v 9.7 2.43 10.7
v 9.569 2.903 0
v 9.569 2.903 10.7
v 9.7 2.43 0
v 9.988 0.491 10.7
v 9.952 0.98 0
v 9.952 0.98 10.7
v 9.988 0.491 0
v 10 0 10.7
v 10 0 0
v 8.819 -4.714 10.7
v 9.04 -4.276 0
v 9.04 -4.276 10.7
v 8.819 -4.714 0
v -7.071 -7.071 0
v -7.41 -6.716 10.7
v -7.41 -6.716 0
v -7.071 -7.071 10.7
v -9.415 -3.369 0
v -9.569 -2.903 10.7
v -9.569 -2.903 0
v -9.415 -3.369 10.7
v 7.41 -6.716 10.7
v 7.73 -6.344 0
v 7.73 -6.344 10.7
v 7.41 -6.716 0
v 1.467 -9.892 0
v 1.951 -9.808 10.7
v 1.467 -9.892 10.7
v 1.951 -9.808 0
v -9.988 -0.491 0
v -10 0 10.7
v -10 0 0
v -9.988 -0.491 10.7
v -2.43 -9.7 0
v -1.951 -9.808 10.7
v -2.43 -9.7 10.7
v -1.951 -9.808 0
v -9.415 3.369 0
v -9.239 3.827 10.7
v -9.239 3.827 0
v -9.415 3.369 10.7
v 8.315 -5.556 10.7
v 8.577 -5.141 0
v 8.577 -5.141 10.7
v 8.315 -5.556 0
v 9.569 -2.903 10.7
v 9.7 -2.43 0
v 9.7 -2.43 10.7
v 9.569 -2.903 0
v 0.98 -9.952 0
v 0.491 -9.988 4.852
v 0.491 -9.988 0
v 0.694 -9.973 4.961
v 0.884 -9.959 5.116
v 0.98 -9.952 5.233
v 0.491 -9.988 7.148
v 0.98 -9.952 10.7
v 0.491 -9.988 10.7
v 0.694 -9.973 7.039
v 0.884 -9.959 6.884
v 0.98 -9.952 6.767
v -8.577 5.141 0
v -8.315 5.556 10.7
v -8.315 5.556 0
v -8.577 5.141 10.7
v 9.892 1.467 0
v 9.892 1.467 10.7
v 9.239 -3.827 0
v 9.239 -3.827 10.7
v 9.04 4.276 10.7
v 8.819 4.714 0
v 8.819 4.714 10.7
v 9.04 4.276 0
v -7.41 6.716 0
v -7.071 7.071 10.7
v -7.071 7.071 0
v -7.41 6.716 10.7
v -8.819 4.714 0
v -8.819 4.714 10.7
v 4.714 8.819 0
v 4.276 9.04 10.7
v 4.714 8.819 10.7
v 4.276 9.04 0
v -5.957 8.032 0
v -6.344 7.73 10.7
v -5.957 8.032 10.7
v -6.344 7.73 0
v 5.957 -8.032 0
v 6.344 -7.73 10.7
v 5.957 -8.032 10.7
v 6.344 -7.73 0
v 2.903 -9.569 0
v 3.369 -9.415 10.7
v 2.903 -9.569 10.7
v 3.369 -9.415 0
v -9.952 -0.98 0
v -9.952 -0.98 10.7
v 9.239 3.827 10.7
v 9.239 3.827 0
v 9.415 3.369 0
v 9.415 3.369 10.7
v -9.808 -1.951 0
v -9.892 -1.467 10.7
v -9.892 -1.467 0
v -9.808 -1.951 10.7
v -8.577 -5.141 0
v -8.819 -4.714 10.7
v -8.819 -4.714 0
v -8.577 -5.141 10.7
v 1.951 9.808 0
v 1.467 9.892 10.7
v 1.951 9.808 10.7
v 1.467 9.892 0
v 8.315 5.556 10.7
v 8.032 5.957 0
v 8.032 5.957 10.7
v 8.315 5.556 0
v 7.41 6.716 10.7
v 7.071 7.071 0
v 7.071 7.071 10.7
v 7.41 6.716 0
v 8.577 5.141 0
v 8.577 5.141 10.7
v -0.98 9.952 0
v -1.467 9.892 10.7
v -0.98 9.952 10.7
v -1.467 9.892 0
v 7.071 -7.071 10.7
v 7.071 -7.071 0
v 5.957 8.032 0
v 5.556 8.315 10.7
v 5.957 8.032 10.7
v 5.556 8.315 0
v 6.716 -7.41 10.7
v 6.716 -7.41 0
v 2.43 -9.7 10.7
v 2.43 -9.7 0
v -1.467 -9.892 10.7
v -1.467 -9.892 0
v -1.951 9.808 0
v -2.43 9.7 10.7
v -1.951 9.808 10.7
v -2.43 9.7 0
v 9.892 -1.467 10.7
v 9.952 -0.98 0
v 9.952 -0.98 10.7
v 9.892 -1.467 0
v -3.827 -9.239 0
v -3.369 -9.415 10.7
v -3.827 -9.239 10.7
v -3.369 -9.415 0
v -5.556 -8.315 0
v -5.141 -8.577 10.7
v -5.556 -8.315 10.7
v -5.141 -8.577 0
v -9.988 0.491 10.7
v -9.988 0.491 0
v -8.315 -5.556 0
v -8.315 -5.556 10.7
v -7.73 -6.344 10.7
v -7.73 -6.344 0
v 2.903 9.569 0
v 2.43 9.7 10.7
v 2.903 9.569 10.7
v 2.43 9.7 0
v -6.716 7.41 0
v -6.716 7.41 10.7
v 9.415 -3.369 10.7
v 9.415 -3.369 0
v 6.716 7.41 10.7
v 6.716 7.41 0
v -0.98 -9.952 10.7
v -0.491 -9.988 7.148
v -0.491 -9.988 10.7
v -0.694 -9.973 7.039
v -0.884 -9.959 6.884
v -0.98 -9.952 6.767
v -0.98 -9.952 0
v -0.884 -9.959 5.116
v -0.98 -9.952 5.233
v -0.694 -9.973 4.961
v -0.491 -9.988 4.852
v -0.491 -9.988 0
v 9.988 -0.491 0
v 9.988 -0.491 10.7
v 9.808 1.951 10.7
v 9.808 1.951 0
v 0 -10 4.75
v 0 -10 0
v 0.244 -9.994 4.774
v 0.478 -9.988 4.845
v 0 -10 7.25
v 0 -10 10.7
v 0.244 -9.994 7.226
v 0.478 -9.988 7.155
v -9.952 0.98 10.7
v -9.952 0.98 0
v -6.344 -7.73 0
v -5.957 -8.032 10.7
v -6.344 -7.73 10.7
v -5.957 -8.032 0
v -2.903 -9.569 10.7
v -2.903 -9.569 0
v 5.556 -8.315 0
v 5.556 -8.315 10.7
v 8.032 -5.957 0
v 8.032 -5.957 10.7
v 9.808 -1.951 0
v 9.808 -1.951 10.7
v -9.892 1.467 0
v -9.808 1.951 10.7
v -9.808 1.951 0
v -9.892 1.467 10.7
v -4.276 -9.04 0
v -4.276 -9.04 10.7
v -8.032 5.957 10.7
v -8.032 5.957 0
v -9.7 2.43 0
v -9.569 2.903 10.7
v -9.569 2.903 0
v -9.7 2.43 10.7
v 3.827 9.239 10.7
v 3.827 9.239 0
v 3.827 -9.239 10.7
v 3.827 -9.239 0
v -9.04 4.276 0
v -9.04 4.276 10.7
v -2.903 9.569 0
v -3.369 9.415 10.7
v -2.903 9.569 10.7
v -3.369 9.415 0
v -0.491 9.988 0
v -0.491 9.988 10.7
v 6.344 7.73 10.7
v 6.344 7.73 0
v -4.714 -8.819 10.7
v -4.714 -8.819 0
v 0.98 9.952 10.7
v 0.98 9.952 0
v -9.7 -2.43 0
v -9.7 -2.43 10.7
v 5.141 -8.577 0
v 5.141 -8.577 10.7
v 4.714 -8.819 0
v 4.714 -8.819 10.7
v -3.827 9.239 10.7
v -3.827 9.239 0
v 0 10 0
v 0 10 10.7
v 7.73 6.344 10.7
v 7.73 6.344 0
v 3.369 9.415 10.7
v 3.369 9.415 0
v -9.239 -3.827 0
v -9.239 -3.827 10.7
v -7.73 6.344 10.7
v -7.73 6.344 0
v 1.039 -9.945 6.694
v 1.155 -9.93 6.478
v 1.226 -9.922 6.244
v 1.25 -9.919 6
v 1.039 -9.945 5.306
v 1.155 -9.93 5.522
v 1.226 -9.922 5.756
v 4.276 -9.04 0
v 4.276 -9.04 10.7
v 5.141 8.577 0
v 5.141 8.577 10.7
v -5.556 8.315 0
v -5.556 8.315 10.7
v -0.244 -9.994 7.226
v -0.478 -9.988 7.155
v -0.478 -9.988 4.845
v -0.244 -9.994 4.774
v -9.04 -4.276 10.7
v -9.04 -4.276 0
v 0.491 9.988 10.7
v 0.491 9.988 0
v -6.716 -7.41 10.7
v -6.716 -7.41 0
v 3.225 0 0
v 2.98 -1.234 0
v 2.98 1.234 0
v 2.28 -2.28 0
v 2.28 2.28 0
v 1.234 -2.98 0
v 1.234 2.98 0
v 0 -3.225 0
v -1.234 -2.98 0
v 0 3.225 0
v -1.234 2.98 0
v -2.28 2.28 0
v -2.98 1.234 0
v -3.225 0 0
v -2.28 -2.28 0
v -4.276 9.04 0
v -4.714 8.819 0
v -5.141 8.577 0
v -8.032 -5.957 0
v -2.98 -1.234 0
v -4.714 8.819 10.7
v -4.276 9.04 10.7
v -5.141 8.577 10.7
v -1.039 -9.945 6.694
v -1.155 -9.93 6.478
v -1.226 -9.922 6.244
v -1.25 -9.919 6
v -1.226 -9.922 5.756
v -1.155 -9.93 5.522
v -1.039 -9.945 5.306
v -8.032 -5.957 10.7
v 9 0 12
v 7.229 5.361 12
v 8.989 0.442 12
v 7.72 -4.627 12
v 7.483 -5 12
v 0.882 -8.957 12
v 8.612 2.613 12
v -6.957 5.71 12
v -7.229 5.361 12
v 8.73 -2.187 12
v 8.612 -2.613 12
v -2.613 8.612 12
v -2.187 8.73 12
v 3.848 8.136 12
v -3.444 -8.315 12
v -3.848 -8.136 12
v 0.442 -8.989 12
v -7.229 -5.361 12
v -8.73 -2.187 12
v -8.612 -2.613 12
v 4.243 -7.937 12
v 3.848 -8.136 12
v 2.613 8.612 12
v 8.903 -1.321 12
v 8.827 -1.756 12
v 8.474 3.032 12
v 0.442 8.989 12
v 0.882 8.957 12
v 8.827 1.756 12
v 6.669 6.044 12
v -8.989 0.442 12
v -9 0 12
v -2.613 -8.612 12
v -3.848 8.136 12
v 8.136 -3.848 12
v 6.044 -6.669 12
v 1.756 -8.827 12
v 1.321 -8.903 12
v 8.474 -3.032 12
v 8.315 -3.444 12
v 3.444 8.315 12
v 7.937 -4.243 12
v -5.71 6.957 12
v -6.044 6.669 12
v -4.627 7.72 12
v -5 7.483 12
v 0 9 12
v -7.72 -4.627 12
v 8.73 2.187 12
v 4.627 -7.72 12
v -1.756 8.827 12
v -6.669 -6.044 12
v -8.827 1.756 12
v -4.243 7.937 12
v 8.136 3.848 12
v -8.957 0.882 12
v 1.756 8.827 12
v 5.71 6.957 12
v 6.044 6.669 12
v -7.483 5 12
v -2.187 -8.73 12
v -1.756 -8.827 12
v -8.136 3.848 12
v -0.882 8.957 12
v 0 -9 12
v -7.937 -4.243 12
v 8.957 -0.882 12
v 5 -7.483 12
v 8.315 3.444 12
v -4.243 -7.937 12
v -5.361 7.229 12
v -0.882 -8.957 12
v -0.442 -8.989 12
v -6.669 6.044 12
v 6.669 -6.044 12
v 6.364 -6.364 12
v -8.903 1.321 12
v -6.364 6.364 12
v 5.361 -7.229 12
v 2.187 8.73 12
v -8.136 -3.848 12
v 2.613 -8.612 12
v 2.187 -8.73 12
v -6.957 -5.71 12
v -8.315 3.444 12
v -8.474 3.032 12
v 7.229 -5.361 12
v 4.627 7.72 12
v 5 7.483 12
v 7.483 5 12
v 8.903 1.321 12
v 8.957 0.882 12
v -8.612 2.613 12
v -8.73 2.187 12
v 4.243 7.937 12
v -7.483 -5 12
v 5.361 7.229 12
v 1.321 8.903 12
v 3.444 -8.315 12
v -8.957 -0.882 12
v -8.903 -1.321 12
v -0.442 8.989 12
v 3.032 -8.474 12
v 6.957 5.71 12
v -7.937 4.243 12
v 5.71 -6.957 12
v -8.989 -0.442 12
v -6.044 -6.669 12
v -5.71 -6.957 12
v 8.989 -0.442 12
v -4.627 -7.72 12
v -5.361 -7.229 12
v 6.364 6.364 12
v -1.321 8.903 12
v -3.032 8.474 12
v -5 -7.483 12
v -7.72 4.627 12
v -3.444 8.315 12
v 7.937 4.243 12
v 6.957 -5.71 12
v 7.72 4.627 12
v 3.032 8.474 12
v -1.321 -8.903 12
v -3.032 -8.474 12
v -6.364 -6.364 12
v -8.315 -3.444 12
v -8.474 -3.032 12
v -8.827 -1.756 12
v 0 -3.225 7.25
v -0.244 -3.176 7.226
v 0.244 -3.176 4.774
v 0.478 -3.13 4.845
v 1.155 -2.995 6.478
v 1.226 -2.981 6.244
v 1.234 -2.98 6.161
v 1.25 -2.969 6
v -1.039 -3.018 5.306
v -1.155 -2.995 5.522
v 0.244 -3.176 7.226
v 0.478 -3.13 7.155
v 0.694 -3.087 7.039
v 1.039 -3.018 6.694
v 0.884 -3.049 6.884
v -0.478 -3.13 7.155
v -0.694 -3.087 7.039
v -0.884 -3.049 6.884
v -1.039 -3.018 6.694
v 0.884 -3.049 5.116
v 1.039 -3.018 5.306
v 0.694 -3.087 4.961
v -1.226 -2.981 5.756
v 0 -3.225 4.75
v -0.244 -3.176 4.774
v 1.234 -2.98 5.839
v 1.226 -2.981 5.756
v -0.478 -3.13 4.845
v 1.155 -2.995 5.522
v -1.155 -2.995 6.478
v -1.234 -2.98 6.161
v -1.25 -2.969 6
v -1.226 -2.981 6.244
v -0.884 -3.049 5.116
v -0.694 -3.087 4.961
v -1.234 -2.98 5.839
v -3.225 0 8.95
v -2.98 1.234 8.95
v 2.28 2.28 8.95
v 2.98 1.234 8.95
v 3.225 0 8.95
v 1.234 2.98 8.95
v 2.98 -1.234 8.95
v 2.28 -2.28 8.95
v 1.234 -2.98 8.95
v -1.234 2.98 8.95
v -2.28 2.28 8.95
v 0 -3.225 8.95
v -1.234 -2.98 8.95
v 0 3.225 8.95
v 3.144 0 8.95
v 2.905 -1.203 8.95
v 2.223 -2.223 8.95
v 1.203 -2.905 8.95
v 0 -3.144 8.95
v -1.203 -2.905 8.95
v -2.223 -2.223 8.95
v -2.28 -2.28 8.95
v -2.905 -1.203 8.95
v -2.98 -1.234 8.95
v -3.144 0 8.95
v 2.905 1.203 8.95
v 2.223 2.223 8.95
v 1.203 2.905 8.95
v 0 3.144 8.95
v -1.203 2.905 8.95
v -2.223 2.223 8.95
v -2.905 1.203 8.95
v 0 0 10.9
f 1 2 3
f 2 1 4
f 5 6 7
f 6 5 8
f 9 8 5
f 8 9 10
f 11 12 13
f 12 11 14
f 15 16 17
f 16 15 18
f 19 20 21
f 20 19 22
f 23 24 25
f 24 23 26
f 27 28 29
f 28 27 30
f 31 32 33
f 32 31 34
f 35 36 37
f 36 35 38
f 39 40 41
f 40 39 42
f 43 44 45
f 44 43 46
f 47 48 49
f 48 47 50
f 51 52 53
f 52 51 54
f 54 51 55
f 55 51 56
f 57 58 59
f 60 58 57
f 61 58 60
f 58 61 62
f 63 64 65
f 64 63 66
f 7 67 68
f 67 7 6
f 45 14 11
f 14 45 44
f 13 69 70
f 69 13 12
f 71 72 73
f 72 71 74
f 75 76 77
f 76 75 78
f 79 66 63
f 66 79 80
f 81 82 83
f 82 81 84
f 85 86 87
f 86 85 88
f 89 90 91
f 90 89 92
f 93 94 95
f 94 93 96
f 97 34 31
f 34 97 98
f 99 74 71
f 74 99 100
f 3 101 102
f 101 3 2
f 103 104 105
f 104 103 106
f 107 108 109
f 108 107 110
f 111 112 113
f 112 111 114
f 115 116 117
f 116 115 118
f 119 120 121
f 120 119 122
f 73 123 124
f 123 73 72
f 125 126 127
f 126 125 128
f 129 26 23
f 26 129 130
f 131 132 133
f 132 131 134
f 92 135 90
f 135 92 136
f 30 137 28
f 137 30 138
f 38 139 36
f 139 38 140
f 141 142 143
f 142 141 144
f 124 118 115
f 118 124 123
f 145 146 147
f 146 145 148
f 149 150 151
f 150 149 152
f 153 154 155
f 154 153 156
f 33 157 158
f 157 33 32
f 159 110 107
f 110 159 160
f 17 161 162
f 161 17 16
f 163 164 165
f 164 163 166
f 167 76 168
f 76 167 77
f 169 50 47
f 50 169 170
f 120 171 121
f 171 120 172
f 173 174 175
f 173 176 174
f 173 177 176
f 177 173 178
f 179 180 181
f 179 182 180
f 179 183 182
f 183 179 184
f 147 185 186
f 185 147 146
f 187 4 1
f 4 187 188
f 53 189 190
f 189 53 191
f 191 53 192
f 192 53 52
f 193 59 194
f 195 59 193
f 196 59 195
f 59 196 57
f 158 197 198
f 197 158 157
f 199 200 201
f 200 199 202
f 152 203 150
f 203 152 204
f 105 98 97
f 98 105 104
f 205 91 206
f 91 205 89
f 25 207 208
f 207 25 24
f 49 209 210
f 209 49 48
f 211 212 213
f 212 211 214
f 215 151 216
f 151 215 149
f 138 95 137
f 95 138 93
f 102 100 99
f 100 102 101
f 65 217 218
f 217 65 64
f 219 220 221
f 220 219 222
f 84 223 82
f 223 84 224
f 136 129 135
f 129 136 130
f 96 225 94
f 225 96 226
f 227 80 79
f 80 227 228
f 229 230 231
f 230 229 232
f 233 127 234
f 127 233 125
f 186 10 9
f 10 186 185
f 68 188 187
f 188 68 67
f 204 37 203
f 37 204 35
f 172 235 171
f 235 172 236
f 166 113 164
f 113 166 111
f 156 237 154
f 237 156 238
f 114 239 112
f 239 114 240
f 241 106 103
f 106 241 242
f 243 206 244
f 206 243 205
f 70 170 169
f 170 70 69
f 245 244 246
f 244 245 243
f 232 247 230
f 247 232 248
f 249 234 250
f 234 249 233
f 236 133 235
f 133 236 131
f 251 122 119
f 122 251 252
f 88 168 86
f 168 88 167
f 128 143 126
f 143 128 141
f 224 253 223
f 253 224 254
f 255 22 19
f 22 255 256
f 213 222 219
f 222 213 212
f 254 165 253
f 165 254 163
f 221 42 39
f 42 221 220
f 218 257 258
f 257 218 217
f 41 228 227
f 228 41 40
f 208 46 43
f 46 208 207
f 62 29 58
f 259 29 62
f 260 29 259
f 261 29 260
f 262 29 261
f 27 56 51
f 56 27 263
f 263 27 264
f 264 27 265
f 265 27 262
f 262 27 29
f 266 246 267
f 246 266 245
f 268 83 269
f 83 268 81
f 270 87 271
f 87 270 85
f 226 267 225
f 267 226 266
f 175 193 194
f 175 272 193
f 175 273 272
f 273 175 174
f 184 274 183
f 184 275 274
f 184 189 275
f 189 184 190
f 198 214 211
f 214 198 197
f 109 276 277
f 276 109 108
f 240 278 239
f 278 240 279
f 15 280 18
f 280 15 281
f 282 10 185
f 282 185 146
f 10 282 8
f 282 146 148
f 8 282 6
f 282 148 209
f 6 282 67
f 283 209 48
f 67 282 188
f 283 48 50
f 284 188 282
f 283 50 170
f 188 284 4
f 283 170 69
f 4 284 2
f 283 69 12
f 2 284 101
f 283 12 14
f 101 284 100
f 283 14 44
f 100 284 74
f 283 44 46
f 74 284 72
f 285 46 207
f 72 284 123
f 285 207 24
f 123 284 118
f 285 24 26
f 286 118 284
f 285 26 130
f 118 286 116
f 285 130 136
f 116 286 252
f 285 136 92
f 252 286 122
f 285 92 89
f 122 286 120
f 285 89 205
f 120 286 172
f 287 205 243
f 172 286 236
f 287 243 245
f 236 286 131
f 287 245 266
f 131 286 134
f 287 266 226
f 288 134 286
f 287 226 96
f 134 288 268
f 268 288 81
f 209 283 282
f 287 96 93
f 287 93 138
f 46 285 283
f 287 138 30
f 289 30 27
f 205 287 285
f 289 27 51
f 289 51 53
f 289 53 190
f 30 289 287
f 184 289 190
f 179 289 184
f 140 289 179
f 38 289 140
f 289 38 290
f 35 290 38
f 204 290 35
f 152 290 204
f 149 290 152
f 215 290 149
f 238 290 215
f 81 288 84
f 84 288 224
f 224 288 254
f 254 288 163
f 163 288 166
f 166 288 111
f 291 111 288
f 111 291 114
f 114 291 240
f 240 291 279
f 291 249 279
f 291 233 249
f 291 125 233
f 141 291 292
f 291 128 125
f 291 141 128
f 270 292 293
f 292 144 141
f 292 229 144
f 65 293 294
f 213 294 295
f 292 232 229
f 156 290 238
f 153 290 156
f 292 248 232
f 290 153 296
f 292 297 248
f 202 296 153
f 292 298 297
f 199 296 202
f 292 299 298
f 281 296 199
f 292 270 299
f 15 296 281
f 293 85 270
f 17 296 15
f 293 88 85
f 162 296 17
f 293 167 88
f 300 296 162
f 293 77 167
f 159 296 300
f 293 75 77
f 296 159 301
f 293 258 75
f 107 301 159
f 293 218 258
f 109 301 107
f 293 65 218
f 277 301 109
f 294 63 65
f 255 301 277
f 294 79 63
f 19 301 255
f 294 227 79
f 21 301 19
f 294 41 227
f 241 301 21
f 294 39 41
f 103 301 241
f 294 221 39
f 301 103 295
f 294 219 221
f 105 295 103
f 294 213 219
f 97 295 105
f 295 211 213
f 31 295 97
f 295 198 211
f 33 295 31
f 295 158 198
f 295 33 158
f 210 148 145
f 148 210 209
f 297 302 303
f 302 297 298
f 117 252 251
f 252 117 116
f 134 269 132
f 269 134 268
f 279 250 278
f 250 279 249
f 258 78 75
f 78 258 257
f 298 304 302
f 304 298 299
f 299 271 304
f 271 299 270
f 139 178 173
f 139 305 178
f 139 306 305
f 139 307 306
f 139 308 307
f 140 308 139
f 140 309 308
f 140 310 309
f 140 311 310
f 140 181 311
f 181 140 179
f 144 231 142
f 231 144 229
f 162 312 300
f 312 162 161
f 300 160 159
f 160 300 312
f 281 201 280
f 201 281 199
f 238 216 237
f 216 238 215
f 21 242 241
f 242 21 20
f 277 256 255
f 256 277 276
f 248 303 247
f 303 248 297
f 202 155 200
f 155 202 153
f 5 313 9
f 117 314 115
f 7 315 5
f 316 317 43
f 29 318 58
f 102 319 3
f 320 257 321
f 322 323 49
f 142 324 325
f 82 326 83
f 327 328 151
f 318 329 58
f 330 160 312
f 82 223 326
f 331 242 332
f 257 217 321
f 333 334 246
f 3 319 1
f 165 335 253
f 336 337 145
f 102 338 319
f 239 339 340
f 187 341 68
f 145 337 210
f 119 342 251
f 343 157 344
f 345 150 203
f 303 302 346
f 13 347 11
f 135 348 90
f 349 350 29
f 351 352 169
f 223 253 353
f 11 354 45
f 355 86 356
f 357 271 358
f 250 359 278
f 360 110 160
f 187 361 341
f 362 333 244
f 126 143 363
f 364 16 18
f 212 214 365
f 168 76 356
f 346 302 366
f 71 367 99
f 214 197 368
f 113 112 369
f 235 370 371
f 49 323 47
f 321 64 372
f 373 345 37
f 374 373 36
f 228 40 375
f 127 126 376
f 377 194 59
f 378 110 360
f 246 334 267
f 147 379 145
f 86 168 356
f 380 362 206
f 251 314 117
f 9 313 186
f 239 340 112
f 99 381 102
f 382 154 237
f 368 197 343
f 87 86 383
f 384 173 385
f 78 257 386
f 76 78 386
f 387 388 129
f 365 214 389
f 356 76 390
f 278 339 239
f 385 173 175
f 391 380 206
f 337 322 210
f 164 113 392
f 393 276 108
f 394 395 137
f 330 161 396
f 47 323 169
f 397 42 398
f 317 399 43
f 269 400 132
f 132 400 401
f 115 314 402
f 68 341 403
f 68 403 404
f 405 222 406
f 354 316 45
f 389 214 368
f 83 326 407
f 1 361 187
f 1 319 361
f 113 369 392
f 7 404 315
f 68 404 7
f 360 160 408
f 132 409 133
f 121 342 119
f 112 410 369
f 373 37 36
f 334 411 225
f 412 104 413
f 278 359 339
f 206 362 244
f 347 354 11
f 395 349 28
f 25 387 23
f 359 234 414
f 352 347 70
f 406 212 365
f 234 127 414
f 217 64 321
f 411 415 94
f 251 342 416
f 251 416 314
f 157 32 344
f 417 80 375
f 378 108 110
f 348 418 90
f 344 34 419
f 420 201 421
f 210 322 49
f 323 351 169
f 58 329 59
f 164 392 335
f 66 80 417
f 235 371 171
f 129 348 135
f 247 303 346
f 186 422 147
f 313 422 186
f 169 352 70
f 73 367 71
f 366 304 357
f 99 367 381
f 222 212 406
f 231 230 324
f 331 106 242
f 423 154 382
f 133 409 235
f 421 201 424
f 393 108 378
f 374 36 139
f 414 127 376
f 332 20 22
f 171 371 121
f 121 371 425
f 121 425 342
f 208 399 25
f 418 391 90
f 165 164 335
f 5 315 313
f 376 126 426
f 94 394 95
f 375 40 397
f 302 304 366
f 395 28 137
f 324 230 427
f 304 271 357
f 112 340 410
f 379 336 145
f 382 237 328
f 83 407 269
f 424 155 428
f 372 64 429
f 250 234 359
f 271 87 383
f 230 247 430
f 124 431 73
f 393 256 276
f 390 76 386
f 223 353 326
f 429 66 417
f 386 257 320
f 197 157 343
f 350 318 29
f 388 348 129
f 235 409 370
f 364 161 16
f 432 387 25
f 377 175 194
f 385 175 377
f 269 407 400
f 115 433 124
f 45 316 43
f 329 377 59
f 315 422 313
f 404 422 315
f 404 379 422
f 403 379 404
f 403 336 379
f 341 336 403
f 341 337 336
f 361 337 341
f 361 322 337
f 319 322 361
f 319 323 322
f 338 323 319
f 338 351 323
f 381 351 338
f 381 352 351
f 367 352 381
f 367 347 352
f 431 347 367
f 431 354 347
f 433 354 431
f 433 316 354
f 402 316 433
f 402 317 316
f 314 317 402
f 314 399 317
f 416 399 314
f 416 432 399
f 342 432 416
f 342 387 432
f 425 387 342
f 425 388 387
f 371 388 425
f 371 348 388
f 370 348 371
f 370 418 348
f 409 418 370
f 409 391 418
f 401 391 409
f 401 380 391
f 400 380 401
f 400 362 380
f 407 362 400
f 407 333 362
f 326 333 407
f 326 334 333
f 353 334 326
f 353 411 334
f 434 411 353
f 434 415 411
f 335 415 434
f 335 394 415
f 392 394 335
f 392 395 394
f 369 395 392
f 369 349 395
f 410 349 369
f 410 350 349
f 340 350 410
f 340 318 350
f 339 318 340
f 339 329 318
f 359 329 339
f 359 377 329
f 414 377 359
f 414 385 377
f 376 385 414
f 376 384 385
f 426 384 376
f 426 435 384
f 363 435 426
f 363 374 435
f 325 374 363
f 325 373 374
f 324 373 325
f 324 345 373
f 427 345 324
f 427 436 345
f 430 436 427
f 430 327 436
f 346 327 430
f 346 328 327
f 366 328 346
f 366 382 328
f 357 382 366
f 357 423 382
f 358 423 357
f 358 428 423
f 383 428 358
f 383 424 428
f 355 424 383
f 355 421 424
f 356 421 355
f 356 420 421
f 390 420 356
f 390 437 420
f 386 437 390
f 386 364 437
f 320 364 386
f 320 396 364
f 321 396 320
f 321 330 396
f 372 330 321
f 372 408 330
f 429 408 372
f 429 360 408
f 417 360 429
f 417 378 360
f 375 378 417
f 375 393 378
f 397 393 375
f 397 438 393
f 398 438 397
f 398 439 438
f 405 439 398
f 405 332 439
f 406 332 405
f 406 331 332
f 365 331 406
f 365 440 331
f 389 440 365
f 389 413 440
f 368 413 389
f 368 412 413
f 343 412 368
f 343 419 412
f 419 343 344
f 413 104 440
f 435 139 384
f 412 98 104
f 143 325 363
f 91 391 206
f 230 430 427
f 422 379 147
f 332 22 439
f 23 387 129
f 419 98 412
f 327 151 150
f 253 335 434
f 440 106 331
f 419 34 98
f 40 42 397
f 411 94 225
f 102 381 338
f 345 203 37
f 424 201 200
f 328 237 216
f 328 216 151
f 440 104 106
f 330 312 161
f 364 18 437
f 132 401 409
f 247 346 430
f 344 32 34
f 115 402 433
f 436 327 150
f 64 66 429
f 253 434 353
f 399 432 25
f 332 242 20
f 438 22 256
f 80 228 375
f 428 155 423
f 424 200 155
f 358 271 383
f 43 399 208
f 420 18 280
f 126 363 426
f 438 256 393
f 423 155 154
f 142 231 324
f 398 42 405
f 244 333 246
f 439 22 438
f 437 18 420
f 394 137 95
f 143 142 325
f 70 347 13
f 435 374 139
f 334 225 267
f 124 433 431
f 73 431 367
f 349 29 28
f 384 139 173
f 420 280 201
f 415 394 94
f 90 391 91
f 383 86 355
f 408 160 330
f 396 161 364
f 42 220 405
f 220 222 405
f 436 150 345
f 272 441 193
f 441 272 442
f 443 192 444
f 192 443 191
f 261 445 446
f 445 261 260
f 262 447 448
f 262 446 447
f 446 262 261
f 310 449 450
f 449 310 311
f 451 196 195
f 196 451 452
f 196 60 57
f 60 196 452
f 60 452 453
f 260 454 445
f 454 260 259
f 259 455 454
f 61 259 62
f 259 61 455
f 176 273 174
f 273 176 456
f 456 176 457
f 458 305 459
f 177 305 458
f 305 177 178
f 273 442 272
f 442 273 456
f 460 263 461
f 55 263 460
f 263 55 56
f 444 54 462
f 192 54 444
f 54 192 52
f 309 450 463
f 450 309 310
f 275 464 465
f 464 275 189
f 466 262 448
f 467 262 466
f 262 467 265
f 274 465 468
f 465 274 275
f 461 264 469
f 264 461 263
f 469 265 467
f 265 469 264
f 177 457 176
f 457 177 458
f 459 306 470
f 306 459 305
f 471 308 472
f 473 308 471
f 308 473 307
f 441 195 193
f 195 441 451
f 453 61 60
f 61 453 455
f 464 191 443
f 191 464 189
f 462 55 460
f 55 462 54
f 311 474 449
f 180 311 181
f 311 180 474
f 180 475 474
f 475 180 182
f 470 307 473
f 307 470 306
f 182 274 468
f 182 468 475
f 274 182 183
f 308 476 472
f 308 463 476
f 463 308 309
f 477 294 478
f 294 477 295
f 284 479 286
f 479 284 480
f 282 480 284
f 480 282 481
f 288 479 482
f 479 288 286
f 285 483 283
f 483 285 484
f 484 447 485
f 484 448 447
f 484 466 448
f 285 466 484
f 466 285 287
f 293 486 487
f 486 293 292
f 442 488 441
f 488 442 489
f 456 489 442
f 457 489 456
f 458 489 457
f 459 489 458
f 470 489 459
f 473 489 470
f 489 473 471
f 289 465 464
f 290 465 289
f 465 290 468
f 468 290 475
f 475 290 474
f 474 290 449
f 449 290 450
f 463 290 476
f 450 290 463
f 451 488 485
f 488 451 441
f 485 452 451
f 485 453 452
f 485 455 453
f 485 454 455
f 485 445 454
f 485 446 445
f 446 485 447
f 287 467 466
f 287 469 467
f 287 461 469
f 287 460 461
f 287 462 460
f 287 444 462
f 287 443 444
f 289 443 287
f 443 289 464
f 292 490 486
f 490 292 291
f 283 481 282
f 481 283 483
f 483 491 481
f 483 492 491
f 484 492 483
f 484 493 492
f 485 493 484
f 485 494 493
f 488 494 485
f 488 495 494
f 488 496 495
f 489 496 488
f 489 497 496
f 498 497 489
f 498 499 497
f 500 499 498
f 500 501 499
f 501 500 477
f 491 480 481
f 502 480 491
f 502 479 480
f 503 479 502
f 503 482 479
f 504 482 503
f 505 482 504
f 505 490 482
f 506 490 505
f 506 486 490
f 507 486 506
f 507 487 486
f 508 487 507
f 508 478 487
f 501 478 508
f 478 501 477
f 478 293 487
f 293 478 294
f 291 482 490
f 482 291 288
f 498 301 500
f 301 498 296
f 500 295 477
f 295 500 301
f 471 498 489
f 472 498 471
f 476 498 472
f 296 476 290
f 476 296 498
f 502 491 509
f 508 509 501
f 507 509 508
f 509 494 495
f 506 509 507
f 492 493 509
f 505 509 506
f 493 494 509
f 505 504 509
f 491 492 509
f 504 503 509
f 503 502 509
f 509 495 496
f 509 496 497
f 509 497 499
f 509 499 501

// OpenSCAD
//OpenSCAD-Skript

//Moduldefinition mit Parametern für Frontplattensystem im 19mm-Raster
module PotiKnopf (
//Parameter
diami=6.45,   //Wellendurchmesser Poti
diama=20,    //Außendurchmesser Knopf
diams=2.5,   //Klemmschraubendurchmesser 
hght=12,     //Höhe Knopf
hghti=10,  //Höhe Indikator
wdthi=1      //Breite Indikator
)
//Beginn Modul
{
difference(){   //difference 1
union(){        //union 1
difference(){   //difference 2
union(){        //union 2
    //alles, was vor der nächsten geschweiften Klammer steht, wird zusammengefügt (union 2)
//Körper des Frontplattensegments
cylinder(d=diama,h=hght-1.3,$fn=128);
translate([0,0,hght-1.3]) cylinder(d1=diama,d2=diama-2,h=1.3,$fn=128);
 
//Indikator
translate([-wdthi/2,0,0]) cube([wdthi,diama/2-0.1,hghti]);

}               //union 2 end
    //alles, was vor der nächsten geschweiften Klammer steht, wird davon abgezogen (difference 2)
//Anschrägung Indikator
translate([-wdthi,diama/2,hght-1]) rotate([40,0,0]) cube([2*wdthi,5,5]);
//Bohrung Klemmschraube M3
rotate([90,0,0]) translate([0,hght/2,0]) cylinder(d=diams,h=15,$fn=32);
//Bohrung Achse
translate([0,0,-0.05]) cylinder(d=diami,h=hght-3,$fn=16);
translate([0,0,hght-3-0.1]) cylinder(d1=diami,d2=0,h=2,$fn=16);
}  //difference 2 end
    //alles, was vor der nächsten geschweiften Klammer steht, wird dazu hinzugefügt (union 1)

}               //union 1 end
    //alles, was vor der nächsten geschweiften Klammer steht, wird davon wieder abgezogen (difference 1)

}               //difference 1 end

}  //module end

//Hier werden Instanzen des Moduls aufgerufen
translate([0,0,0]) PotiKnopf();
